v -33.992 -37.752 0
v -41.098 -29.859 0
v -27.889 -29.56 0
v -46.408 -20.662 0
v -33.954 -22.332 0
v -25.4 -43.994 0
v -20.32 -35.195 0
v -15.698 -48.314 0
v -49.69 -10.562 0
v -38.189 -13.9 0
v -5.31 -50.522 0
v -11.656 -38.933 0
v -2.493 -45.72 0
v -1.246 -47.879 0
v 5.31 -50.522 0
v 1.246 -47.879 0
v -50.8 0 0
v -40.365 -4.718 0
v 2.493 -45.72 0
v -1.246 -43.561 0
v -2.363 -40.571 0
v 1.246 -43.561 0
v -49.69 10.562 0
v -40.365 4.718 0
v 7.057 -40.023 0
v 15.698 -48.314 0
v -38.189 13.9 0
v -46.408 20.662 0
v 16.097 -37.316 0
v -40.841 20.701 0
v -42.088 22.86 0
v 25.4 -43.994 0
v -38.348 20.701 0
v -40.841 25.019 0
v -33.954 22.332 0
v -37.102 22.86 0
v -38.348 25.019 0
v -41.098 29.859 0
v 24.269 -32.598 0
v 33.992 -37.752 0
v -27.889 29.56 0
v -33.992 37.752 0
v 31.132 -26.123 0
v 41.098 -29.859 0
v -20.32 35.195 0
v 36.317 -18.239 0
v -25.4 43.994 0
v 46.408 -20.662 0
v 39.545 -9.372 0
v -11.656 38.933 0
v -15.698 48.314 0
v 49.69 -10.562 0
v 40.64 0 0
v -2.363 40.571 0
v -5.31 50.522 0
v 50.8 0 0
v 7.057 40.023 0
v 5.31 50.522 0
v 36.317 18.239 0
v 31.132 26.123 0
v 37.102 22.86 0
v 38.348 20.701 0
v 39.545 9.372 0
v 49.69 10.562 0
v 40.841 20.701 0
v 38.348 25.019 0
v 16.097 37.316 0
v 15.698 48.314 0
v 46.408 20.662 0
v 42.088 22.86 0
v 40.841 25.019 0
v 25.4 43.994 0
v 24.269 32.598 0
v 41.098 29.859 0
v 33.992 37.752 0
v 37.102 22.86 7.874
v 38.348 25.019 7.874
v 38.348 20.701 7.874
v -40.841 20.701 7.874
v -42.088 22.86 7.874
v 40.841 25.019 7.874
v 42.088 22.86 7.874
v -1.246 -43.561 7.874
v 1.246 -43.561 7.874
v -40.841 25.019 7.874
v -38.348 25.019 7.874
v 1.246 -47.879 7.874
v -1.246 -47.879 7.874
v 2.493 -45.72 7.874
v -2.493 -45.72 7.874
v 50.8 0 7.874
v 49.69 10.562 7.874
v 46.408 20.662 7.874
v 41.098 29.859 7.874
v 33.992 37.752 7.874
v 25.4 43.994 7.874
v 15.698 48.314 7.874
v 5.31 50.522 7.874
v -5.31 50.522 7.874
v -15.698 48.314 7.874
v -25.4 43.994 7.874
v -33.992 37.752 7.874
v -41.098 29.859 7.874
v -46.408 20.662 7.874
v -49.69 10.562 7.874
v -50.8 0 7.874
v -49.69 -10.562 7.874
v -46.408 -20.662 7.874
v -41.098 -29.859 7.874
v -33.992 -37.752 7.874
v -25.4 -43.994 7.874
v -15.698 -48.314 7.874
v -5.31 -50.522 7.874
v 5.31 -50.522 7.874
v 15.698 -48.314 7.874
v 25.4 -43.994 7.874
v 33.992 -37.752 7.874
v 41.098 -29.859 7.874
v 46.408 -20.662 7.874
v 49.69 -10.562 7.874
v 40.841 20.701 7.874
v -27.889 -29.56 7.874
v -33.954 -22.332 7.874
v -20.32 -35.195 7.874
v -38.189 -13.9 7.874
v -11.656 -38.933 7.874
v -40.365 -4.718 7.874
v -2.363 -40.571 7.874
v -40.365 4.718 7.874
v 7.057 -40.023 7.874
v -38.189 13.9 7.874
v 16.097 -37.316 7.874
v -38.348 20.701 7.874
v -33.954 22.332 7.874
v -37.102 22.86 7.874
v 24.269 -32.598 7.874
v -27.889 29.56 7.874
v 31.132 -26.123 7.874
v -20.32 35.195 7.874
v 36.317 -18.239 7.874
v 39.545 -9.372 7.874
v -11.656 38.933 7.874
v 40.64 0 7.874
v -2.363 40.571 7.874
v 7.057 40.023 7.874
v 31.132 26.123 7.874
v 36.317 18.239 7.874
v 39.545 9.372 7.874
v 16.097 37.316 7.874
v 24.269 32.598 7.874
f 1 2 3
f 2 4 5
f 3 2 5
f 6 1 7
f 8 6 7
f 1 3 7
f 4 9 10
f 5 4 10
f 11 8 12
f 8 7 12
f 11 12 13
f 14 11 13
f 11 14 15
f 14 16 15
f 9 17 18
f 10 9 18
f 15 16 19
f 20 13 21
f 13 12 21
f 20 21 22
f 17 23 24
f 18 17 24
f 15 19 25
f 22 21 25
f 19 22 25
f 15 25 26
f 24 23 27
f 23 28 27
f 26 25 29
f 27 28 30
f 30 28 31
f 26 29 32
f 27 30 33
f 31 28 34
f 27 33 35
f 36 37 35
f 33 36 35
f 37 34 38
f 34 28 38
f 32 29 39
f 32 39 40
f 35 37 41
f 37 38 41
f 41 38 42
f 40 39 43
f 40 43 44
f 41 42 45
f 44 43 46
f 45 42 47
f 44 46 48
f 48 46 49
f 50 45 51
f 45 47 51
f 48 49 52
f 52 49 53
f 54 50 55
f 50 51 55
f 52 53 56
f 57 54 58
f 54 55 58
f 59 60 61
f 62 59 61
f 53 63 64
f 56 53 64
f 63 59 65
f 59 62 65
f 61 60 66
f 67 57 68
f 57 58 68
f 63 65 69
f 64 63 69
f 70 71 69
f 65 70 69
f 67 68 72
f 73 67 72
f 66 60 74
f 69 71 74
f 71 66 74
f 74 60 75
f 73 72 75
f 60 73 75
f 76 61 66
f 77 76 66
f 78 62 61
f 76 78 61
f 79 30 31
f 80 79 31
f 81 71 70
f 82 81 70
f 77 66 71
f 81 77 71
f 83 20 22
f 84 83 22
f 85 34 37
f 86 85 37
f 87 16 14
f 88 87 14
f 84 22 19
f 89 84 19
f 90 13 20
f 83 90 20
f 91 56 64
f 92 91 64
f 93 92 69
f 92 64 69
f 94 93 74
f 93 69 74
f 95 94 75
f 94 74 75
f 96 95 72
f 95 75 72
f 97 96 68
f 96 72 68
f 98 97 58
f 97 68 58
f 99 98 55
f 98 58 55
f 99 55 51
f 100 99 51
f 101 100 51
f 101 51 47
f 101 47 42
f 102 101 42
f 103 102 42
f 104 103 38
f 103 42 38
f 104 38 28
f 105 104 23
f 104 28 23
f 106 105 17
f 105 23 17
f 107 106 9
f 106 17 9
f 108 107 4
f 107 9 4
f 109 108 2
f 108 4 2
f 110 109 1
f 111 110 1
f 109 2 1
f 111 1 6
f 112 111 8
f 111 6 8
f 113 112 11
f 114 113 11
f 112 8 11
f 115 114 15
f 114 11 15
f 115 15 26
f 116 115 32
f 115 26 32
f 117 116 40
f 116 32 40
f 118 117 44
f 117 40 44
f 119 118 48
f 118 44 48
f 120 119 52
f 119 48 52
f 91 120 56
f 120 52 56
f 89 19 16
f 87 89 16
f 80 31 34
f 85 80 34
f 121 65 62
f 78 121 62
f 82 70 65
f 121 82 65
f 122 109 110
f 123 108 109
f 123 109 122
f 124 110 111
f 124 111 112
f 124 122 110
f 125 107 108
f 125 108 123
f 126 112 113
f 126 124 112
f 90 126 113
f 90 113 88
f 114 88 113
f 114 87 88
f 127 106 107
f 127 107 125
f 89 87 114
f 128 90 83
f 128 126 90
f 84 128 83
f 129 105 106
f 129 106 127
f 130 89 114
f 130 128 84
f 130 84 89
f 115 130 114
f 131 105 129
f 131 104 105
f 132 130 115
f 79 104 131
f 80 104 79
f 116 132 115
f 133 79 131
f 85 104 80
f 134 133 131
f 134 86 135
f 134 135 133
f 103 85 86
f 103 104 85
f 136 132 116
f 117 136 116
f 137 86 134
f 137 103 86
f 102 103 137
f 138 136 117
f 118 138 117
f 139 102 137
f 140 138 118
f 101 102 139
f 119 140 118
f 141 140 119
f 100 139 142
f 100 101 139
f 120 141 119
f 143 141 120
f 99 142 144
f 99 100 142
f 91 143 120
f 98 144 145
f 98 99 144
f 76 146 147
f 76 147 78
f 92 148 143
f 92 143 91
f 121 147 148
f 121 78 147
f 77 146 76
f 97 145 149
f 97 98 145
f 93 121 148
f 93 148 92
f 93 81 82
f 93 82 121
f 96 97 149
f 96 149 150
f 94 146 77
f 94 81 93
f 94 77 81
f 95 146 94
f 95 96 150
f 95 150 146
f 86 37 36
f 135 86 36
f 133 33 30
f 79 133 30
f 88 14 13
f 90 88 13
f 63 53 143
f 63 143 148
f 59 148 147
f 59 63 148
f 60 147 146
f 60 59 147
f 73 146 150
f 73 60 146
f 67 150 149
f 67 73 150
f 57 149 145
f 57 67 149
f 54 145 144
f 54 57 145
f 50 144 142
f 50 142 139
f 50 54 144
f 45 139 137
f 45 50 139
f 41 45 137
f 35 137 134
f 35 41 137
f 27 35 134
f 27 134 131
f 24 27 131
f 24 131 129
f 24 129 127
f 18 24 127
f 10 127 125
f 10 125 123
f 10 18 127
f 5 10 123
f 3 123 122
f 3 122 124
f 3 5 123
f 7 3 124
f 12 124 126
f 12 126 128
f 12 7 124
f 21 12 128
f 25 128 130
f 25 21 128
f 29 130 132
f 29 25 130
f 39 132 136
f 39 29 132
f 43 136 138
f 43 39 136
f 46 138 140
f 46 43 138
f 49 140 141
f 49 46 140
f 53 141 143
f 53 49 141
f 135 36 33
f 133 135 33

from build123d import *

# Parameters (mm, degrees)
F0_R     = 50.8
F0_R_2   = 40.64
F1_DEPTH = 7.874


with BuildPart() as f1:
    # F0 (on Top) → F1 (new body)
    with BuildSketch(Plane.XY):
        Circle(F0_R)
        Polygon((2.492998, -45.72), (1.246499, -47.879), (-1.246499, -47.879), (-2.492998, -45.72), (-1.246499, -43.561), (1.246499, -43.561), align=None, mode=Mode.SUBTRACT)
        Circle(F0_R_2, mode=Mode.SUBTRACT)
        Polygon((-42.08768, 22.86), (-40.841181, 25.019), (-38.348182, 25.019), (-37.101683, 22.86), (-38.348182, 20.701), (-40.841181, 20.701), align=None, mode=Mode.SUBTRACT)
        Polygon((37.101683, 22.86), (38.348182, 25.019), (40.841181, 25.019), (42.08768, 22.86), (40.841181, 20.701), (38.348182, 20.701), align=None, mode=Mode.SUBTRACT)
    extrude(amount=F1_DEPTH)


solid = f1.part
